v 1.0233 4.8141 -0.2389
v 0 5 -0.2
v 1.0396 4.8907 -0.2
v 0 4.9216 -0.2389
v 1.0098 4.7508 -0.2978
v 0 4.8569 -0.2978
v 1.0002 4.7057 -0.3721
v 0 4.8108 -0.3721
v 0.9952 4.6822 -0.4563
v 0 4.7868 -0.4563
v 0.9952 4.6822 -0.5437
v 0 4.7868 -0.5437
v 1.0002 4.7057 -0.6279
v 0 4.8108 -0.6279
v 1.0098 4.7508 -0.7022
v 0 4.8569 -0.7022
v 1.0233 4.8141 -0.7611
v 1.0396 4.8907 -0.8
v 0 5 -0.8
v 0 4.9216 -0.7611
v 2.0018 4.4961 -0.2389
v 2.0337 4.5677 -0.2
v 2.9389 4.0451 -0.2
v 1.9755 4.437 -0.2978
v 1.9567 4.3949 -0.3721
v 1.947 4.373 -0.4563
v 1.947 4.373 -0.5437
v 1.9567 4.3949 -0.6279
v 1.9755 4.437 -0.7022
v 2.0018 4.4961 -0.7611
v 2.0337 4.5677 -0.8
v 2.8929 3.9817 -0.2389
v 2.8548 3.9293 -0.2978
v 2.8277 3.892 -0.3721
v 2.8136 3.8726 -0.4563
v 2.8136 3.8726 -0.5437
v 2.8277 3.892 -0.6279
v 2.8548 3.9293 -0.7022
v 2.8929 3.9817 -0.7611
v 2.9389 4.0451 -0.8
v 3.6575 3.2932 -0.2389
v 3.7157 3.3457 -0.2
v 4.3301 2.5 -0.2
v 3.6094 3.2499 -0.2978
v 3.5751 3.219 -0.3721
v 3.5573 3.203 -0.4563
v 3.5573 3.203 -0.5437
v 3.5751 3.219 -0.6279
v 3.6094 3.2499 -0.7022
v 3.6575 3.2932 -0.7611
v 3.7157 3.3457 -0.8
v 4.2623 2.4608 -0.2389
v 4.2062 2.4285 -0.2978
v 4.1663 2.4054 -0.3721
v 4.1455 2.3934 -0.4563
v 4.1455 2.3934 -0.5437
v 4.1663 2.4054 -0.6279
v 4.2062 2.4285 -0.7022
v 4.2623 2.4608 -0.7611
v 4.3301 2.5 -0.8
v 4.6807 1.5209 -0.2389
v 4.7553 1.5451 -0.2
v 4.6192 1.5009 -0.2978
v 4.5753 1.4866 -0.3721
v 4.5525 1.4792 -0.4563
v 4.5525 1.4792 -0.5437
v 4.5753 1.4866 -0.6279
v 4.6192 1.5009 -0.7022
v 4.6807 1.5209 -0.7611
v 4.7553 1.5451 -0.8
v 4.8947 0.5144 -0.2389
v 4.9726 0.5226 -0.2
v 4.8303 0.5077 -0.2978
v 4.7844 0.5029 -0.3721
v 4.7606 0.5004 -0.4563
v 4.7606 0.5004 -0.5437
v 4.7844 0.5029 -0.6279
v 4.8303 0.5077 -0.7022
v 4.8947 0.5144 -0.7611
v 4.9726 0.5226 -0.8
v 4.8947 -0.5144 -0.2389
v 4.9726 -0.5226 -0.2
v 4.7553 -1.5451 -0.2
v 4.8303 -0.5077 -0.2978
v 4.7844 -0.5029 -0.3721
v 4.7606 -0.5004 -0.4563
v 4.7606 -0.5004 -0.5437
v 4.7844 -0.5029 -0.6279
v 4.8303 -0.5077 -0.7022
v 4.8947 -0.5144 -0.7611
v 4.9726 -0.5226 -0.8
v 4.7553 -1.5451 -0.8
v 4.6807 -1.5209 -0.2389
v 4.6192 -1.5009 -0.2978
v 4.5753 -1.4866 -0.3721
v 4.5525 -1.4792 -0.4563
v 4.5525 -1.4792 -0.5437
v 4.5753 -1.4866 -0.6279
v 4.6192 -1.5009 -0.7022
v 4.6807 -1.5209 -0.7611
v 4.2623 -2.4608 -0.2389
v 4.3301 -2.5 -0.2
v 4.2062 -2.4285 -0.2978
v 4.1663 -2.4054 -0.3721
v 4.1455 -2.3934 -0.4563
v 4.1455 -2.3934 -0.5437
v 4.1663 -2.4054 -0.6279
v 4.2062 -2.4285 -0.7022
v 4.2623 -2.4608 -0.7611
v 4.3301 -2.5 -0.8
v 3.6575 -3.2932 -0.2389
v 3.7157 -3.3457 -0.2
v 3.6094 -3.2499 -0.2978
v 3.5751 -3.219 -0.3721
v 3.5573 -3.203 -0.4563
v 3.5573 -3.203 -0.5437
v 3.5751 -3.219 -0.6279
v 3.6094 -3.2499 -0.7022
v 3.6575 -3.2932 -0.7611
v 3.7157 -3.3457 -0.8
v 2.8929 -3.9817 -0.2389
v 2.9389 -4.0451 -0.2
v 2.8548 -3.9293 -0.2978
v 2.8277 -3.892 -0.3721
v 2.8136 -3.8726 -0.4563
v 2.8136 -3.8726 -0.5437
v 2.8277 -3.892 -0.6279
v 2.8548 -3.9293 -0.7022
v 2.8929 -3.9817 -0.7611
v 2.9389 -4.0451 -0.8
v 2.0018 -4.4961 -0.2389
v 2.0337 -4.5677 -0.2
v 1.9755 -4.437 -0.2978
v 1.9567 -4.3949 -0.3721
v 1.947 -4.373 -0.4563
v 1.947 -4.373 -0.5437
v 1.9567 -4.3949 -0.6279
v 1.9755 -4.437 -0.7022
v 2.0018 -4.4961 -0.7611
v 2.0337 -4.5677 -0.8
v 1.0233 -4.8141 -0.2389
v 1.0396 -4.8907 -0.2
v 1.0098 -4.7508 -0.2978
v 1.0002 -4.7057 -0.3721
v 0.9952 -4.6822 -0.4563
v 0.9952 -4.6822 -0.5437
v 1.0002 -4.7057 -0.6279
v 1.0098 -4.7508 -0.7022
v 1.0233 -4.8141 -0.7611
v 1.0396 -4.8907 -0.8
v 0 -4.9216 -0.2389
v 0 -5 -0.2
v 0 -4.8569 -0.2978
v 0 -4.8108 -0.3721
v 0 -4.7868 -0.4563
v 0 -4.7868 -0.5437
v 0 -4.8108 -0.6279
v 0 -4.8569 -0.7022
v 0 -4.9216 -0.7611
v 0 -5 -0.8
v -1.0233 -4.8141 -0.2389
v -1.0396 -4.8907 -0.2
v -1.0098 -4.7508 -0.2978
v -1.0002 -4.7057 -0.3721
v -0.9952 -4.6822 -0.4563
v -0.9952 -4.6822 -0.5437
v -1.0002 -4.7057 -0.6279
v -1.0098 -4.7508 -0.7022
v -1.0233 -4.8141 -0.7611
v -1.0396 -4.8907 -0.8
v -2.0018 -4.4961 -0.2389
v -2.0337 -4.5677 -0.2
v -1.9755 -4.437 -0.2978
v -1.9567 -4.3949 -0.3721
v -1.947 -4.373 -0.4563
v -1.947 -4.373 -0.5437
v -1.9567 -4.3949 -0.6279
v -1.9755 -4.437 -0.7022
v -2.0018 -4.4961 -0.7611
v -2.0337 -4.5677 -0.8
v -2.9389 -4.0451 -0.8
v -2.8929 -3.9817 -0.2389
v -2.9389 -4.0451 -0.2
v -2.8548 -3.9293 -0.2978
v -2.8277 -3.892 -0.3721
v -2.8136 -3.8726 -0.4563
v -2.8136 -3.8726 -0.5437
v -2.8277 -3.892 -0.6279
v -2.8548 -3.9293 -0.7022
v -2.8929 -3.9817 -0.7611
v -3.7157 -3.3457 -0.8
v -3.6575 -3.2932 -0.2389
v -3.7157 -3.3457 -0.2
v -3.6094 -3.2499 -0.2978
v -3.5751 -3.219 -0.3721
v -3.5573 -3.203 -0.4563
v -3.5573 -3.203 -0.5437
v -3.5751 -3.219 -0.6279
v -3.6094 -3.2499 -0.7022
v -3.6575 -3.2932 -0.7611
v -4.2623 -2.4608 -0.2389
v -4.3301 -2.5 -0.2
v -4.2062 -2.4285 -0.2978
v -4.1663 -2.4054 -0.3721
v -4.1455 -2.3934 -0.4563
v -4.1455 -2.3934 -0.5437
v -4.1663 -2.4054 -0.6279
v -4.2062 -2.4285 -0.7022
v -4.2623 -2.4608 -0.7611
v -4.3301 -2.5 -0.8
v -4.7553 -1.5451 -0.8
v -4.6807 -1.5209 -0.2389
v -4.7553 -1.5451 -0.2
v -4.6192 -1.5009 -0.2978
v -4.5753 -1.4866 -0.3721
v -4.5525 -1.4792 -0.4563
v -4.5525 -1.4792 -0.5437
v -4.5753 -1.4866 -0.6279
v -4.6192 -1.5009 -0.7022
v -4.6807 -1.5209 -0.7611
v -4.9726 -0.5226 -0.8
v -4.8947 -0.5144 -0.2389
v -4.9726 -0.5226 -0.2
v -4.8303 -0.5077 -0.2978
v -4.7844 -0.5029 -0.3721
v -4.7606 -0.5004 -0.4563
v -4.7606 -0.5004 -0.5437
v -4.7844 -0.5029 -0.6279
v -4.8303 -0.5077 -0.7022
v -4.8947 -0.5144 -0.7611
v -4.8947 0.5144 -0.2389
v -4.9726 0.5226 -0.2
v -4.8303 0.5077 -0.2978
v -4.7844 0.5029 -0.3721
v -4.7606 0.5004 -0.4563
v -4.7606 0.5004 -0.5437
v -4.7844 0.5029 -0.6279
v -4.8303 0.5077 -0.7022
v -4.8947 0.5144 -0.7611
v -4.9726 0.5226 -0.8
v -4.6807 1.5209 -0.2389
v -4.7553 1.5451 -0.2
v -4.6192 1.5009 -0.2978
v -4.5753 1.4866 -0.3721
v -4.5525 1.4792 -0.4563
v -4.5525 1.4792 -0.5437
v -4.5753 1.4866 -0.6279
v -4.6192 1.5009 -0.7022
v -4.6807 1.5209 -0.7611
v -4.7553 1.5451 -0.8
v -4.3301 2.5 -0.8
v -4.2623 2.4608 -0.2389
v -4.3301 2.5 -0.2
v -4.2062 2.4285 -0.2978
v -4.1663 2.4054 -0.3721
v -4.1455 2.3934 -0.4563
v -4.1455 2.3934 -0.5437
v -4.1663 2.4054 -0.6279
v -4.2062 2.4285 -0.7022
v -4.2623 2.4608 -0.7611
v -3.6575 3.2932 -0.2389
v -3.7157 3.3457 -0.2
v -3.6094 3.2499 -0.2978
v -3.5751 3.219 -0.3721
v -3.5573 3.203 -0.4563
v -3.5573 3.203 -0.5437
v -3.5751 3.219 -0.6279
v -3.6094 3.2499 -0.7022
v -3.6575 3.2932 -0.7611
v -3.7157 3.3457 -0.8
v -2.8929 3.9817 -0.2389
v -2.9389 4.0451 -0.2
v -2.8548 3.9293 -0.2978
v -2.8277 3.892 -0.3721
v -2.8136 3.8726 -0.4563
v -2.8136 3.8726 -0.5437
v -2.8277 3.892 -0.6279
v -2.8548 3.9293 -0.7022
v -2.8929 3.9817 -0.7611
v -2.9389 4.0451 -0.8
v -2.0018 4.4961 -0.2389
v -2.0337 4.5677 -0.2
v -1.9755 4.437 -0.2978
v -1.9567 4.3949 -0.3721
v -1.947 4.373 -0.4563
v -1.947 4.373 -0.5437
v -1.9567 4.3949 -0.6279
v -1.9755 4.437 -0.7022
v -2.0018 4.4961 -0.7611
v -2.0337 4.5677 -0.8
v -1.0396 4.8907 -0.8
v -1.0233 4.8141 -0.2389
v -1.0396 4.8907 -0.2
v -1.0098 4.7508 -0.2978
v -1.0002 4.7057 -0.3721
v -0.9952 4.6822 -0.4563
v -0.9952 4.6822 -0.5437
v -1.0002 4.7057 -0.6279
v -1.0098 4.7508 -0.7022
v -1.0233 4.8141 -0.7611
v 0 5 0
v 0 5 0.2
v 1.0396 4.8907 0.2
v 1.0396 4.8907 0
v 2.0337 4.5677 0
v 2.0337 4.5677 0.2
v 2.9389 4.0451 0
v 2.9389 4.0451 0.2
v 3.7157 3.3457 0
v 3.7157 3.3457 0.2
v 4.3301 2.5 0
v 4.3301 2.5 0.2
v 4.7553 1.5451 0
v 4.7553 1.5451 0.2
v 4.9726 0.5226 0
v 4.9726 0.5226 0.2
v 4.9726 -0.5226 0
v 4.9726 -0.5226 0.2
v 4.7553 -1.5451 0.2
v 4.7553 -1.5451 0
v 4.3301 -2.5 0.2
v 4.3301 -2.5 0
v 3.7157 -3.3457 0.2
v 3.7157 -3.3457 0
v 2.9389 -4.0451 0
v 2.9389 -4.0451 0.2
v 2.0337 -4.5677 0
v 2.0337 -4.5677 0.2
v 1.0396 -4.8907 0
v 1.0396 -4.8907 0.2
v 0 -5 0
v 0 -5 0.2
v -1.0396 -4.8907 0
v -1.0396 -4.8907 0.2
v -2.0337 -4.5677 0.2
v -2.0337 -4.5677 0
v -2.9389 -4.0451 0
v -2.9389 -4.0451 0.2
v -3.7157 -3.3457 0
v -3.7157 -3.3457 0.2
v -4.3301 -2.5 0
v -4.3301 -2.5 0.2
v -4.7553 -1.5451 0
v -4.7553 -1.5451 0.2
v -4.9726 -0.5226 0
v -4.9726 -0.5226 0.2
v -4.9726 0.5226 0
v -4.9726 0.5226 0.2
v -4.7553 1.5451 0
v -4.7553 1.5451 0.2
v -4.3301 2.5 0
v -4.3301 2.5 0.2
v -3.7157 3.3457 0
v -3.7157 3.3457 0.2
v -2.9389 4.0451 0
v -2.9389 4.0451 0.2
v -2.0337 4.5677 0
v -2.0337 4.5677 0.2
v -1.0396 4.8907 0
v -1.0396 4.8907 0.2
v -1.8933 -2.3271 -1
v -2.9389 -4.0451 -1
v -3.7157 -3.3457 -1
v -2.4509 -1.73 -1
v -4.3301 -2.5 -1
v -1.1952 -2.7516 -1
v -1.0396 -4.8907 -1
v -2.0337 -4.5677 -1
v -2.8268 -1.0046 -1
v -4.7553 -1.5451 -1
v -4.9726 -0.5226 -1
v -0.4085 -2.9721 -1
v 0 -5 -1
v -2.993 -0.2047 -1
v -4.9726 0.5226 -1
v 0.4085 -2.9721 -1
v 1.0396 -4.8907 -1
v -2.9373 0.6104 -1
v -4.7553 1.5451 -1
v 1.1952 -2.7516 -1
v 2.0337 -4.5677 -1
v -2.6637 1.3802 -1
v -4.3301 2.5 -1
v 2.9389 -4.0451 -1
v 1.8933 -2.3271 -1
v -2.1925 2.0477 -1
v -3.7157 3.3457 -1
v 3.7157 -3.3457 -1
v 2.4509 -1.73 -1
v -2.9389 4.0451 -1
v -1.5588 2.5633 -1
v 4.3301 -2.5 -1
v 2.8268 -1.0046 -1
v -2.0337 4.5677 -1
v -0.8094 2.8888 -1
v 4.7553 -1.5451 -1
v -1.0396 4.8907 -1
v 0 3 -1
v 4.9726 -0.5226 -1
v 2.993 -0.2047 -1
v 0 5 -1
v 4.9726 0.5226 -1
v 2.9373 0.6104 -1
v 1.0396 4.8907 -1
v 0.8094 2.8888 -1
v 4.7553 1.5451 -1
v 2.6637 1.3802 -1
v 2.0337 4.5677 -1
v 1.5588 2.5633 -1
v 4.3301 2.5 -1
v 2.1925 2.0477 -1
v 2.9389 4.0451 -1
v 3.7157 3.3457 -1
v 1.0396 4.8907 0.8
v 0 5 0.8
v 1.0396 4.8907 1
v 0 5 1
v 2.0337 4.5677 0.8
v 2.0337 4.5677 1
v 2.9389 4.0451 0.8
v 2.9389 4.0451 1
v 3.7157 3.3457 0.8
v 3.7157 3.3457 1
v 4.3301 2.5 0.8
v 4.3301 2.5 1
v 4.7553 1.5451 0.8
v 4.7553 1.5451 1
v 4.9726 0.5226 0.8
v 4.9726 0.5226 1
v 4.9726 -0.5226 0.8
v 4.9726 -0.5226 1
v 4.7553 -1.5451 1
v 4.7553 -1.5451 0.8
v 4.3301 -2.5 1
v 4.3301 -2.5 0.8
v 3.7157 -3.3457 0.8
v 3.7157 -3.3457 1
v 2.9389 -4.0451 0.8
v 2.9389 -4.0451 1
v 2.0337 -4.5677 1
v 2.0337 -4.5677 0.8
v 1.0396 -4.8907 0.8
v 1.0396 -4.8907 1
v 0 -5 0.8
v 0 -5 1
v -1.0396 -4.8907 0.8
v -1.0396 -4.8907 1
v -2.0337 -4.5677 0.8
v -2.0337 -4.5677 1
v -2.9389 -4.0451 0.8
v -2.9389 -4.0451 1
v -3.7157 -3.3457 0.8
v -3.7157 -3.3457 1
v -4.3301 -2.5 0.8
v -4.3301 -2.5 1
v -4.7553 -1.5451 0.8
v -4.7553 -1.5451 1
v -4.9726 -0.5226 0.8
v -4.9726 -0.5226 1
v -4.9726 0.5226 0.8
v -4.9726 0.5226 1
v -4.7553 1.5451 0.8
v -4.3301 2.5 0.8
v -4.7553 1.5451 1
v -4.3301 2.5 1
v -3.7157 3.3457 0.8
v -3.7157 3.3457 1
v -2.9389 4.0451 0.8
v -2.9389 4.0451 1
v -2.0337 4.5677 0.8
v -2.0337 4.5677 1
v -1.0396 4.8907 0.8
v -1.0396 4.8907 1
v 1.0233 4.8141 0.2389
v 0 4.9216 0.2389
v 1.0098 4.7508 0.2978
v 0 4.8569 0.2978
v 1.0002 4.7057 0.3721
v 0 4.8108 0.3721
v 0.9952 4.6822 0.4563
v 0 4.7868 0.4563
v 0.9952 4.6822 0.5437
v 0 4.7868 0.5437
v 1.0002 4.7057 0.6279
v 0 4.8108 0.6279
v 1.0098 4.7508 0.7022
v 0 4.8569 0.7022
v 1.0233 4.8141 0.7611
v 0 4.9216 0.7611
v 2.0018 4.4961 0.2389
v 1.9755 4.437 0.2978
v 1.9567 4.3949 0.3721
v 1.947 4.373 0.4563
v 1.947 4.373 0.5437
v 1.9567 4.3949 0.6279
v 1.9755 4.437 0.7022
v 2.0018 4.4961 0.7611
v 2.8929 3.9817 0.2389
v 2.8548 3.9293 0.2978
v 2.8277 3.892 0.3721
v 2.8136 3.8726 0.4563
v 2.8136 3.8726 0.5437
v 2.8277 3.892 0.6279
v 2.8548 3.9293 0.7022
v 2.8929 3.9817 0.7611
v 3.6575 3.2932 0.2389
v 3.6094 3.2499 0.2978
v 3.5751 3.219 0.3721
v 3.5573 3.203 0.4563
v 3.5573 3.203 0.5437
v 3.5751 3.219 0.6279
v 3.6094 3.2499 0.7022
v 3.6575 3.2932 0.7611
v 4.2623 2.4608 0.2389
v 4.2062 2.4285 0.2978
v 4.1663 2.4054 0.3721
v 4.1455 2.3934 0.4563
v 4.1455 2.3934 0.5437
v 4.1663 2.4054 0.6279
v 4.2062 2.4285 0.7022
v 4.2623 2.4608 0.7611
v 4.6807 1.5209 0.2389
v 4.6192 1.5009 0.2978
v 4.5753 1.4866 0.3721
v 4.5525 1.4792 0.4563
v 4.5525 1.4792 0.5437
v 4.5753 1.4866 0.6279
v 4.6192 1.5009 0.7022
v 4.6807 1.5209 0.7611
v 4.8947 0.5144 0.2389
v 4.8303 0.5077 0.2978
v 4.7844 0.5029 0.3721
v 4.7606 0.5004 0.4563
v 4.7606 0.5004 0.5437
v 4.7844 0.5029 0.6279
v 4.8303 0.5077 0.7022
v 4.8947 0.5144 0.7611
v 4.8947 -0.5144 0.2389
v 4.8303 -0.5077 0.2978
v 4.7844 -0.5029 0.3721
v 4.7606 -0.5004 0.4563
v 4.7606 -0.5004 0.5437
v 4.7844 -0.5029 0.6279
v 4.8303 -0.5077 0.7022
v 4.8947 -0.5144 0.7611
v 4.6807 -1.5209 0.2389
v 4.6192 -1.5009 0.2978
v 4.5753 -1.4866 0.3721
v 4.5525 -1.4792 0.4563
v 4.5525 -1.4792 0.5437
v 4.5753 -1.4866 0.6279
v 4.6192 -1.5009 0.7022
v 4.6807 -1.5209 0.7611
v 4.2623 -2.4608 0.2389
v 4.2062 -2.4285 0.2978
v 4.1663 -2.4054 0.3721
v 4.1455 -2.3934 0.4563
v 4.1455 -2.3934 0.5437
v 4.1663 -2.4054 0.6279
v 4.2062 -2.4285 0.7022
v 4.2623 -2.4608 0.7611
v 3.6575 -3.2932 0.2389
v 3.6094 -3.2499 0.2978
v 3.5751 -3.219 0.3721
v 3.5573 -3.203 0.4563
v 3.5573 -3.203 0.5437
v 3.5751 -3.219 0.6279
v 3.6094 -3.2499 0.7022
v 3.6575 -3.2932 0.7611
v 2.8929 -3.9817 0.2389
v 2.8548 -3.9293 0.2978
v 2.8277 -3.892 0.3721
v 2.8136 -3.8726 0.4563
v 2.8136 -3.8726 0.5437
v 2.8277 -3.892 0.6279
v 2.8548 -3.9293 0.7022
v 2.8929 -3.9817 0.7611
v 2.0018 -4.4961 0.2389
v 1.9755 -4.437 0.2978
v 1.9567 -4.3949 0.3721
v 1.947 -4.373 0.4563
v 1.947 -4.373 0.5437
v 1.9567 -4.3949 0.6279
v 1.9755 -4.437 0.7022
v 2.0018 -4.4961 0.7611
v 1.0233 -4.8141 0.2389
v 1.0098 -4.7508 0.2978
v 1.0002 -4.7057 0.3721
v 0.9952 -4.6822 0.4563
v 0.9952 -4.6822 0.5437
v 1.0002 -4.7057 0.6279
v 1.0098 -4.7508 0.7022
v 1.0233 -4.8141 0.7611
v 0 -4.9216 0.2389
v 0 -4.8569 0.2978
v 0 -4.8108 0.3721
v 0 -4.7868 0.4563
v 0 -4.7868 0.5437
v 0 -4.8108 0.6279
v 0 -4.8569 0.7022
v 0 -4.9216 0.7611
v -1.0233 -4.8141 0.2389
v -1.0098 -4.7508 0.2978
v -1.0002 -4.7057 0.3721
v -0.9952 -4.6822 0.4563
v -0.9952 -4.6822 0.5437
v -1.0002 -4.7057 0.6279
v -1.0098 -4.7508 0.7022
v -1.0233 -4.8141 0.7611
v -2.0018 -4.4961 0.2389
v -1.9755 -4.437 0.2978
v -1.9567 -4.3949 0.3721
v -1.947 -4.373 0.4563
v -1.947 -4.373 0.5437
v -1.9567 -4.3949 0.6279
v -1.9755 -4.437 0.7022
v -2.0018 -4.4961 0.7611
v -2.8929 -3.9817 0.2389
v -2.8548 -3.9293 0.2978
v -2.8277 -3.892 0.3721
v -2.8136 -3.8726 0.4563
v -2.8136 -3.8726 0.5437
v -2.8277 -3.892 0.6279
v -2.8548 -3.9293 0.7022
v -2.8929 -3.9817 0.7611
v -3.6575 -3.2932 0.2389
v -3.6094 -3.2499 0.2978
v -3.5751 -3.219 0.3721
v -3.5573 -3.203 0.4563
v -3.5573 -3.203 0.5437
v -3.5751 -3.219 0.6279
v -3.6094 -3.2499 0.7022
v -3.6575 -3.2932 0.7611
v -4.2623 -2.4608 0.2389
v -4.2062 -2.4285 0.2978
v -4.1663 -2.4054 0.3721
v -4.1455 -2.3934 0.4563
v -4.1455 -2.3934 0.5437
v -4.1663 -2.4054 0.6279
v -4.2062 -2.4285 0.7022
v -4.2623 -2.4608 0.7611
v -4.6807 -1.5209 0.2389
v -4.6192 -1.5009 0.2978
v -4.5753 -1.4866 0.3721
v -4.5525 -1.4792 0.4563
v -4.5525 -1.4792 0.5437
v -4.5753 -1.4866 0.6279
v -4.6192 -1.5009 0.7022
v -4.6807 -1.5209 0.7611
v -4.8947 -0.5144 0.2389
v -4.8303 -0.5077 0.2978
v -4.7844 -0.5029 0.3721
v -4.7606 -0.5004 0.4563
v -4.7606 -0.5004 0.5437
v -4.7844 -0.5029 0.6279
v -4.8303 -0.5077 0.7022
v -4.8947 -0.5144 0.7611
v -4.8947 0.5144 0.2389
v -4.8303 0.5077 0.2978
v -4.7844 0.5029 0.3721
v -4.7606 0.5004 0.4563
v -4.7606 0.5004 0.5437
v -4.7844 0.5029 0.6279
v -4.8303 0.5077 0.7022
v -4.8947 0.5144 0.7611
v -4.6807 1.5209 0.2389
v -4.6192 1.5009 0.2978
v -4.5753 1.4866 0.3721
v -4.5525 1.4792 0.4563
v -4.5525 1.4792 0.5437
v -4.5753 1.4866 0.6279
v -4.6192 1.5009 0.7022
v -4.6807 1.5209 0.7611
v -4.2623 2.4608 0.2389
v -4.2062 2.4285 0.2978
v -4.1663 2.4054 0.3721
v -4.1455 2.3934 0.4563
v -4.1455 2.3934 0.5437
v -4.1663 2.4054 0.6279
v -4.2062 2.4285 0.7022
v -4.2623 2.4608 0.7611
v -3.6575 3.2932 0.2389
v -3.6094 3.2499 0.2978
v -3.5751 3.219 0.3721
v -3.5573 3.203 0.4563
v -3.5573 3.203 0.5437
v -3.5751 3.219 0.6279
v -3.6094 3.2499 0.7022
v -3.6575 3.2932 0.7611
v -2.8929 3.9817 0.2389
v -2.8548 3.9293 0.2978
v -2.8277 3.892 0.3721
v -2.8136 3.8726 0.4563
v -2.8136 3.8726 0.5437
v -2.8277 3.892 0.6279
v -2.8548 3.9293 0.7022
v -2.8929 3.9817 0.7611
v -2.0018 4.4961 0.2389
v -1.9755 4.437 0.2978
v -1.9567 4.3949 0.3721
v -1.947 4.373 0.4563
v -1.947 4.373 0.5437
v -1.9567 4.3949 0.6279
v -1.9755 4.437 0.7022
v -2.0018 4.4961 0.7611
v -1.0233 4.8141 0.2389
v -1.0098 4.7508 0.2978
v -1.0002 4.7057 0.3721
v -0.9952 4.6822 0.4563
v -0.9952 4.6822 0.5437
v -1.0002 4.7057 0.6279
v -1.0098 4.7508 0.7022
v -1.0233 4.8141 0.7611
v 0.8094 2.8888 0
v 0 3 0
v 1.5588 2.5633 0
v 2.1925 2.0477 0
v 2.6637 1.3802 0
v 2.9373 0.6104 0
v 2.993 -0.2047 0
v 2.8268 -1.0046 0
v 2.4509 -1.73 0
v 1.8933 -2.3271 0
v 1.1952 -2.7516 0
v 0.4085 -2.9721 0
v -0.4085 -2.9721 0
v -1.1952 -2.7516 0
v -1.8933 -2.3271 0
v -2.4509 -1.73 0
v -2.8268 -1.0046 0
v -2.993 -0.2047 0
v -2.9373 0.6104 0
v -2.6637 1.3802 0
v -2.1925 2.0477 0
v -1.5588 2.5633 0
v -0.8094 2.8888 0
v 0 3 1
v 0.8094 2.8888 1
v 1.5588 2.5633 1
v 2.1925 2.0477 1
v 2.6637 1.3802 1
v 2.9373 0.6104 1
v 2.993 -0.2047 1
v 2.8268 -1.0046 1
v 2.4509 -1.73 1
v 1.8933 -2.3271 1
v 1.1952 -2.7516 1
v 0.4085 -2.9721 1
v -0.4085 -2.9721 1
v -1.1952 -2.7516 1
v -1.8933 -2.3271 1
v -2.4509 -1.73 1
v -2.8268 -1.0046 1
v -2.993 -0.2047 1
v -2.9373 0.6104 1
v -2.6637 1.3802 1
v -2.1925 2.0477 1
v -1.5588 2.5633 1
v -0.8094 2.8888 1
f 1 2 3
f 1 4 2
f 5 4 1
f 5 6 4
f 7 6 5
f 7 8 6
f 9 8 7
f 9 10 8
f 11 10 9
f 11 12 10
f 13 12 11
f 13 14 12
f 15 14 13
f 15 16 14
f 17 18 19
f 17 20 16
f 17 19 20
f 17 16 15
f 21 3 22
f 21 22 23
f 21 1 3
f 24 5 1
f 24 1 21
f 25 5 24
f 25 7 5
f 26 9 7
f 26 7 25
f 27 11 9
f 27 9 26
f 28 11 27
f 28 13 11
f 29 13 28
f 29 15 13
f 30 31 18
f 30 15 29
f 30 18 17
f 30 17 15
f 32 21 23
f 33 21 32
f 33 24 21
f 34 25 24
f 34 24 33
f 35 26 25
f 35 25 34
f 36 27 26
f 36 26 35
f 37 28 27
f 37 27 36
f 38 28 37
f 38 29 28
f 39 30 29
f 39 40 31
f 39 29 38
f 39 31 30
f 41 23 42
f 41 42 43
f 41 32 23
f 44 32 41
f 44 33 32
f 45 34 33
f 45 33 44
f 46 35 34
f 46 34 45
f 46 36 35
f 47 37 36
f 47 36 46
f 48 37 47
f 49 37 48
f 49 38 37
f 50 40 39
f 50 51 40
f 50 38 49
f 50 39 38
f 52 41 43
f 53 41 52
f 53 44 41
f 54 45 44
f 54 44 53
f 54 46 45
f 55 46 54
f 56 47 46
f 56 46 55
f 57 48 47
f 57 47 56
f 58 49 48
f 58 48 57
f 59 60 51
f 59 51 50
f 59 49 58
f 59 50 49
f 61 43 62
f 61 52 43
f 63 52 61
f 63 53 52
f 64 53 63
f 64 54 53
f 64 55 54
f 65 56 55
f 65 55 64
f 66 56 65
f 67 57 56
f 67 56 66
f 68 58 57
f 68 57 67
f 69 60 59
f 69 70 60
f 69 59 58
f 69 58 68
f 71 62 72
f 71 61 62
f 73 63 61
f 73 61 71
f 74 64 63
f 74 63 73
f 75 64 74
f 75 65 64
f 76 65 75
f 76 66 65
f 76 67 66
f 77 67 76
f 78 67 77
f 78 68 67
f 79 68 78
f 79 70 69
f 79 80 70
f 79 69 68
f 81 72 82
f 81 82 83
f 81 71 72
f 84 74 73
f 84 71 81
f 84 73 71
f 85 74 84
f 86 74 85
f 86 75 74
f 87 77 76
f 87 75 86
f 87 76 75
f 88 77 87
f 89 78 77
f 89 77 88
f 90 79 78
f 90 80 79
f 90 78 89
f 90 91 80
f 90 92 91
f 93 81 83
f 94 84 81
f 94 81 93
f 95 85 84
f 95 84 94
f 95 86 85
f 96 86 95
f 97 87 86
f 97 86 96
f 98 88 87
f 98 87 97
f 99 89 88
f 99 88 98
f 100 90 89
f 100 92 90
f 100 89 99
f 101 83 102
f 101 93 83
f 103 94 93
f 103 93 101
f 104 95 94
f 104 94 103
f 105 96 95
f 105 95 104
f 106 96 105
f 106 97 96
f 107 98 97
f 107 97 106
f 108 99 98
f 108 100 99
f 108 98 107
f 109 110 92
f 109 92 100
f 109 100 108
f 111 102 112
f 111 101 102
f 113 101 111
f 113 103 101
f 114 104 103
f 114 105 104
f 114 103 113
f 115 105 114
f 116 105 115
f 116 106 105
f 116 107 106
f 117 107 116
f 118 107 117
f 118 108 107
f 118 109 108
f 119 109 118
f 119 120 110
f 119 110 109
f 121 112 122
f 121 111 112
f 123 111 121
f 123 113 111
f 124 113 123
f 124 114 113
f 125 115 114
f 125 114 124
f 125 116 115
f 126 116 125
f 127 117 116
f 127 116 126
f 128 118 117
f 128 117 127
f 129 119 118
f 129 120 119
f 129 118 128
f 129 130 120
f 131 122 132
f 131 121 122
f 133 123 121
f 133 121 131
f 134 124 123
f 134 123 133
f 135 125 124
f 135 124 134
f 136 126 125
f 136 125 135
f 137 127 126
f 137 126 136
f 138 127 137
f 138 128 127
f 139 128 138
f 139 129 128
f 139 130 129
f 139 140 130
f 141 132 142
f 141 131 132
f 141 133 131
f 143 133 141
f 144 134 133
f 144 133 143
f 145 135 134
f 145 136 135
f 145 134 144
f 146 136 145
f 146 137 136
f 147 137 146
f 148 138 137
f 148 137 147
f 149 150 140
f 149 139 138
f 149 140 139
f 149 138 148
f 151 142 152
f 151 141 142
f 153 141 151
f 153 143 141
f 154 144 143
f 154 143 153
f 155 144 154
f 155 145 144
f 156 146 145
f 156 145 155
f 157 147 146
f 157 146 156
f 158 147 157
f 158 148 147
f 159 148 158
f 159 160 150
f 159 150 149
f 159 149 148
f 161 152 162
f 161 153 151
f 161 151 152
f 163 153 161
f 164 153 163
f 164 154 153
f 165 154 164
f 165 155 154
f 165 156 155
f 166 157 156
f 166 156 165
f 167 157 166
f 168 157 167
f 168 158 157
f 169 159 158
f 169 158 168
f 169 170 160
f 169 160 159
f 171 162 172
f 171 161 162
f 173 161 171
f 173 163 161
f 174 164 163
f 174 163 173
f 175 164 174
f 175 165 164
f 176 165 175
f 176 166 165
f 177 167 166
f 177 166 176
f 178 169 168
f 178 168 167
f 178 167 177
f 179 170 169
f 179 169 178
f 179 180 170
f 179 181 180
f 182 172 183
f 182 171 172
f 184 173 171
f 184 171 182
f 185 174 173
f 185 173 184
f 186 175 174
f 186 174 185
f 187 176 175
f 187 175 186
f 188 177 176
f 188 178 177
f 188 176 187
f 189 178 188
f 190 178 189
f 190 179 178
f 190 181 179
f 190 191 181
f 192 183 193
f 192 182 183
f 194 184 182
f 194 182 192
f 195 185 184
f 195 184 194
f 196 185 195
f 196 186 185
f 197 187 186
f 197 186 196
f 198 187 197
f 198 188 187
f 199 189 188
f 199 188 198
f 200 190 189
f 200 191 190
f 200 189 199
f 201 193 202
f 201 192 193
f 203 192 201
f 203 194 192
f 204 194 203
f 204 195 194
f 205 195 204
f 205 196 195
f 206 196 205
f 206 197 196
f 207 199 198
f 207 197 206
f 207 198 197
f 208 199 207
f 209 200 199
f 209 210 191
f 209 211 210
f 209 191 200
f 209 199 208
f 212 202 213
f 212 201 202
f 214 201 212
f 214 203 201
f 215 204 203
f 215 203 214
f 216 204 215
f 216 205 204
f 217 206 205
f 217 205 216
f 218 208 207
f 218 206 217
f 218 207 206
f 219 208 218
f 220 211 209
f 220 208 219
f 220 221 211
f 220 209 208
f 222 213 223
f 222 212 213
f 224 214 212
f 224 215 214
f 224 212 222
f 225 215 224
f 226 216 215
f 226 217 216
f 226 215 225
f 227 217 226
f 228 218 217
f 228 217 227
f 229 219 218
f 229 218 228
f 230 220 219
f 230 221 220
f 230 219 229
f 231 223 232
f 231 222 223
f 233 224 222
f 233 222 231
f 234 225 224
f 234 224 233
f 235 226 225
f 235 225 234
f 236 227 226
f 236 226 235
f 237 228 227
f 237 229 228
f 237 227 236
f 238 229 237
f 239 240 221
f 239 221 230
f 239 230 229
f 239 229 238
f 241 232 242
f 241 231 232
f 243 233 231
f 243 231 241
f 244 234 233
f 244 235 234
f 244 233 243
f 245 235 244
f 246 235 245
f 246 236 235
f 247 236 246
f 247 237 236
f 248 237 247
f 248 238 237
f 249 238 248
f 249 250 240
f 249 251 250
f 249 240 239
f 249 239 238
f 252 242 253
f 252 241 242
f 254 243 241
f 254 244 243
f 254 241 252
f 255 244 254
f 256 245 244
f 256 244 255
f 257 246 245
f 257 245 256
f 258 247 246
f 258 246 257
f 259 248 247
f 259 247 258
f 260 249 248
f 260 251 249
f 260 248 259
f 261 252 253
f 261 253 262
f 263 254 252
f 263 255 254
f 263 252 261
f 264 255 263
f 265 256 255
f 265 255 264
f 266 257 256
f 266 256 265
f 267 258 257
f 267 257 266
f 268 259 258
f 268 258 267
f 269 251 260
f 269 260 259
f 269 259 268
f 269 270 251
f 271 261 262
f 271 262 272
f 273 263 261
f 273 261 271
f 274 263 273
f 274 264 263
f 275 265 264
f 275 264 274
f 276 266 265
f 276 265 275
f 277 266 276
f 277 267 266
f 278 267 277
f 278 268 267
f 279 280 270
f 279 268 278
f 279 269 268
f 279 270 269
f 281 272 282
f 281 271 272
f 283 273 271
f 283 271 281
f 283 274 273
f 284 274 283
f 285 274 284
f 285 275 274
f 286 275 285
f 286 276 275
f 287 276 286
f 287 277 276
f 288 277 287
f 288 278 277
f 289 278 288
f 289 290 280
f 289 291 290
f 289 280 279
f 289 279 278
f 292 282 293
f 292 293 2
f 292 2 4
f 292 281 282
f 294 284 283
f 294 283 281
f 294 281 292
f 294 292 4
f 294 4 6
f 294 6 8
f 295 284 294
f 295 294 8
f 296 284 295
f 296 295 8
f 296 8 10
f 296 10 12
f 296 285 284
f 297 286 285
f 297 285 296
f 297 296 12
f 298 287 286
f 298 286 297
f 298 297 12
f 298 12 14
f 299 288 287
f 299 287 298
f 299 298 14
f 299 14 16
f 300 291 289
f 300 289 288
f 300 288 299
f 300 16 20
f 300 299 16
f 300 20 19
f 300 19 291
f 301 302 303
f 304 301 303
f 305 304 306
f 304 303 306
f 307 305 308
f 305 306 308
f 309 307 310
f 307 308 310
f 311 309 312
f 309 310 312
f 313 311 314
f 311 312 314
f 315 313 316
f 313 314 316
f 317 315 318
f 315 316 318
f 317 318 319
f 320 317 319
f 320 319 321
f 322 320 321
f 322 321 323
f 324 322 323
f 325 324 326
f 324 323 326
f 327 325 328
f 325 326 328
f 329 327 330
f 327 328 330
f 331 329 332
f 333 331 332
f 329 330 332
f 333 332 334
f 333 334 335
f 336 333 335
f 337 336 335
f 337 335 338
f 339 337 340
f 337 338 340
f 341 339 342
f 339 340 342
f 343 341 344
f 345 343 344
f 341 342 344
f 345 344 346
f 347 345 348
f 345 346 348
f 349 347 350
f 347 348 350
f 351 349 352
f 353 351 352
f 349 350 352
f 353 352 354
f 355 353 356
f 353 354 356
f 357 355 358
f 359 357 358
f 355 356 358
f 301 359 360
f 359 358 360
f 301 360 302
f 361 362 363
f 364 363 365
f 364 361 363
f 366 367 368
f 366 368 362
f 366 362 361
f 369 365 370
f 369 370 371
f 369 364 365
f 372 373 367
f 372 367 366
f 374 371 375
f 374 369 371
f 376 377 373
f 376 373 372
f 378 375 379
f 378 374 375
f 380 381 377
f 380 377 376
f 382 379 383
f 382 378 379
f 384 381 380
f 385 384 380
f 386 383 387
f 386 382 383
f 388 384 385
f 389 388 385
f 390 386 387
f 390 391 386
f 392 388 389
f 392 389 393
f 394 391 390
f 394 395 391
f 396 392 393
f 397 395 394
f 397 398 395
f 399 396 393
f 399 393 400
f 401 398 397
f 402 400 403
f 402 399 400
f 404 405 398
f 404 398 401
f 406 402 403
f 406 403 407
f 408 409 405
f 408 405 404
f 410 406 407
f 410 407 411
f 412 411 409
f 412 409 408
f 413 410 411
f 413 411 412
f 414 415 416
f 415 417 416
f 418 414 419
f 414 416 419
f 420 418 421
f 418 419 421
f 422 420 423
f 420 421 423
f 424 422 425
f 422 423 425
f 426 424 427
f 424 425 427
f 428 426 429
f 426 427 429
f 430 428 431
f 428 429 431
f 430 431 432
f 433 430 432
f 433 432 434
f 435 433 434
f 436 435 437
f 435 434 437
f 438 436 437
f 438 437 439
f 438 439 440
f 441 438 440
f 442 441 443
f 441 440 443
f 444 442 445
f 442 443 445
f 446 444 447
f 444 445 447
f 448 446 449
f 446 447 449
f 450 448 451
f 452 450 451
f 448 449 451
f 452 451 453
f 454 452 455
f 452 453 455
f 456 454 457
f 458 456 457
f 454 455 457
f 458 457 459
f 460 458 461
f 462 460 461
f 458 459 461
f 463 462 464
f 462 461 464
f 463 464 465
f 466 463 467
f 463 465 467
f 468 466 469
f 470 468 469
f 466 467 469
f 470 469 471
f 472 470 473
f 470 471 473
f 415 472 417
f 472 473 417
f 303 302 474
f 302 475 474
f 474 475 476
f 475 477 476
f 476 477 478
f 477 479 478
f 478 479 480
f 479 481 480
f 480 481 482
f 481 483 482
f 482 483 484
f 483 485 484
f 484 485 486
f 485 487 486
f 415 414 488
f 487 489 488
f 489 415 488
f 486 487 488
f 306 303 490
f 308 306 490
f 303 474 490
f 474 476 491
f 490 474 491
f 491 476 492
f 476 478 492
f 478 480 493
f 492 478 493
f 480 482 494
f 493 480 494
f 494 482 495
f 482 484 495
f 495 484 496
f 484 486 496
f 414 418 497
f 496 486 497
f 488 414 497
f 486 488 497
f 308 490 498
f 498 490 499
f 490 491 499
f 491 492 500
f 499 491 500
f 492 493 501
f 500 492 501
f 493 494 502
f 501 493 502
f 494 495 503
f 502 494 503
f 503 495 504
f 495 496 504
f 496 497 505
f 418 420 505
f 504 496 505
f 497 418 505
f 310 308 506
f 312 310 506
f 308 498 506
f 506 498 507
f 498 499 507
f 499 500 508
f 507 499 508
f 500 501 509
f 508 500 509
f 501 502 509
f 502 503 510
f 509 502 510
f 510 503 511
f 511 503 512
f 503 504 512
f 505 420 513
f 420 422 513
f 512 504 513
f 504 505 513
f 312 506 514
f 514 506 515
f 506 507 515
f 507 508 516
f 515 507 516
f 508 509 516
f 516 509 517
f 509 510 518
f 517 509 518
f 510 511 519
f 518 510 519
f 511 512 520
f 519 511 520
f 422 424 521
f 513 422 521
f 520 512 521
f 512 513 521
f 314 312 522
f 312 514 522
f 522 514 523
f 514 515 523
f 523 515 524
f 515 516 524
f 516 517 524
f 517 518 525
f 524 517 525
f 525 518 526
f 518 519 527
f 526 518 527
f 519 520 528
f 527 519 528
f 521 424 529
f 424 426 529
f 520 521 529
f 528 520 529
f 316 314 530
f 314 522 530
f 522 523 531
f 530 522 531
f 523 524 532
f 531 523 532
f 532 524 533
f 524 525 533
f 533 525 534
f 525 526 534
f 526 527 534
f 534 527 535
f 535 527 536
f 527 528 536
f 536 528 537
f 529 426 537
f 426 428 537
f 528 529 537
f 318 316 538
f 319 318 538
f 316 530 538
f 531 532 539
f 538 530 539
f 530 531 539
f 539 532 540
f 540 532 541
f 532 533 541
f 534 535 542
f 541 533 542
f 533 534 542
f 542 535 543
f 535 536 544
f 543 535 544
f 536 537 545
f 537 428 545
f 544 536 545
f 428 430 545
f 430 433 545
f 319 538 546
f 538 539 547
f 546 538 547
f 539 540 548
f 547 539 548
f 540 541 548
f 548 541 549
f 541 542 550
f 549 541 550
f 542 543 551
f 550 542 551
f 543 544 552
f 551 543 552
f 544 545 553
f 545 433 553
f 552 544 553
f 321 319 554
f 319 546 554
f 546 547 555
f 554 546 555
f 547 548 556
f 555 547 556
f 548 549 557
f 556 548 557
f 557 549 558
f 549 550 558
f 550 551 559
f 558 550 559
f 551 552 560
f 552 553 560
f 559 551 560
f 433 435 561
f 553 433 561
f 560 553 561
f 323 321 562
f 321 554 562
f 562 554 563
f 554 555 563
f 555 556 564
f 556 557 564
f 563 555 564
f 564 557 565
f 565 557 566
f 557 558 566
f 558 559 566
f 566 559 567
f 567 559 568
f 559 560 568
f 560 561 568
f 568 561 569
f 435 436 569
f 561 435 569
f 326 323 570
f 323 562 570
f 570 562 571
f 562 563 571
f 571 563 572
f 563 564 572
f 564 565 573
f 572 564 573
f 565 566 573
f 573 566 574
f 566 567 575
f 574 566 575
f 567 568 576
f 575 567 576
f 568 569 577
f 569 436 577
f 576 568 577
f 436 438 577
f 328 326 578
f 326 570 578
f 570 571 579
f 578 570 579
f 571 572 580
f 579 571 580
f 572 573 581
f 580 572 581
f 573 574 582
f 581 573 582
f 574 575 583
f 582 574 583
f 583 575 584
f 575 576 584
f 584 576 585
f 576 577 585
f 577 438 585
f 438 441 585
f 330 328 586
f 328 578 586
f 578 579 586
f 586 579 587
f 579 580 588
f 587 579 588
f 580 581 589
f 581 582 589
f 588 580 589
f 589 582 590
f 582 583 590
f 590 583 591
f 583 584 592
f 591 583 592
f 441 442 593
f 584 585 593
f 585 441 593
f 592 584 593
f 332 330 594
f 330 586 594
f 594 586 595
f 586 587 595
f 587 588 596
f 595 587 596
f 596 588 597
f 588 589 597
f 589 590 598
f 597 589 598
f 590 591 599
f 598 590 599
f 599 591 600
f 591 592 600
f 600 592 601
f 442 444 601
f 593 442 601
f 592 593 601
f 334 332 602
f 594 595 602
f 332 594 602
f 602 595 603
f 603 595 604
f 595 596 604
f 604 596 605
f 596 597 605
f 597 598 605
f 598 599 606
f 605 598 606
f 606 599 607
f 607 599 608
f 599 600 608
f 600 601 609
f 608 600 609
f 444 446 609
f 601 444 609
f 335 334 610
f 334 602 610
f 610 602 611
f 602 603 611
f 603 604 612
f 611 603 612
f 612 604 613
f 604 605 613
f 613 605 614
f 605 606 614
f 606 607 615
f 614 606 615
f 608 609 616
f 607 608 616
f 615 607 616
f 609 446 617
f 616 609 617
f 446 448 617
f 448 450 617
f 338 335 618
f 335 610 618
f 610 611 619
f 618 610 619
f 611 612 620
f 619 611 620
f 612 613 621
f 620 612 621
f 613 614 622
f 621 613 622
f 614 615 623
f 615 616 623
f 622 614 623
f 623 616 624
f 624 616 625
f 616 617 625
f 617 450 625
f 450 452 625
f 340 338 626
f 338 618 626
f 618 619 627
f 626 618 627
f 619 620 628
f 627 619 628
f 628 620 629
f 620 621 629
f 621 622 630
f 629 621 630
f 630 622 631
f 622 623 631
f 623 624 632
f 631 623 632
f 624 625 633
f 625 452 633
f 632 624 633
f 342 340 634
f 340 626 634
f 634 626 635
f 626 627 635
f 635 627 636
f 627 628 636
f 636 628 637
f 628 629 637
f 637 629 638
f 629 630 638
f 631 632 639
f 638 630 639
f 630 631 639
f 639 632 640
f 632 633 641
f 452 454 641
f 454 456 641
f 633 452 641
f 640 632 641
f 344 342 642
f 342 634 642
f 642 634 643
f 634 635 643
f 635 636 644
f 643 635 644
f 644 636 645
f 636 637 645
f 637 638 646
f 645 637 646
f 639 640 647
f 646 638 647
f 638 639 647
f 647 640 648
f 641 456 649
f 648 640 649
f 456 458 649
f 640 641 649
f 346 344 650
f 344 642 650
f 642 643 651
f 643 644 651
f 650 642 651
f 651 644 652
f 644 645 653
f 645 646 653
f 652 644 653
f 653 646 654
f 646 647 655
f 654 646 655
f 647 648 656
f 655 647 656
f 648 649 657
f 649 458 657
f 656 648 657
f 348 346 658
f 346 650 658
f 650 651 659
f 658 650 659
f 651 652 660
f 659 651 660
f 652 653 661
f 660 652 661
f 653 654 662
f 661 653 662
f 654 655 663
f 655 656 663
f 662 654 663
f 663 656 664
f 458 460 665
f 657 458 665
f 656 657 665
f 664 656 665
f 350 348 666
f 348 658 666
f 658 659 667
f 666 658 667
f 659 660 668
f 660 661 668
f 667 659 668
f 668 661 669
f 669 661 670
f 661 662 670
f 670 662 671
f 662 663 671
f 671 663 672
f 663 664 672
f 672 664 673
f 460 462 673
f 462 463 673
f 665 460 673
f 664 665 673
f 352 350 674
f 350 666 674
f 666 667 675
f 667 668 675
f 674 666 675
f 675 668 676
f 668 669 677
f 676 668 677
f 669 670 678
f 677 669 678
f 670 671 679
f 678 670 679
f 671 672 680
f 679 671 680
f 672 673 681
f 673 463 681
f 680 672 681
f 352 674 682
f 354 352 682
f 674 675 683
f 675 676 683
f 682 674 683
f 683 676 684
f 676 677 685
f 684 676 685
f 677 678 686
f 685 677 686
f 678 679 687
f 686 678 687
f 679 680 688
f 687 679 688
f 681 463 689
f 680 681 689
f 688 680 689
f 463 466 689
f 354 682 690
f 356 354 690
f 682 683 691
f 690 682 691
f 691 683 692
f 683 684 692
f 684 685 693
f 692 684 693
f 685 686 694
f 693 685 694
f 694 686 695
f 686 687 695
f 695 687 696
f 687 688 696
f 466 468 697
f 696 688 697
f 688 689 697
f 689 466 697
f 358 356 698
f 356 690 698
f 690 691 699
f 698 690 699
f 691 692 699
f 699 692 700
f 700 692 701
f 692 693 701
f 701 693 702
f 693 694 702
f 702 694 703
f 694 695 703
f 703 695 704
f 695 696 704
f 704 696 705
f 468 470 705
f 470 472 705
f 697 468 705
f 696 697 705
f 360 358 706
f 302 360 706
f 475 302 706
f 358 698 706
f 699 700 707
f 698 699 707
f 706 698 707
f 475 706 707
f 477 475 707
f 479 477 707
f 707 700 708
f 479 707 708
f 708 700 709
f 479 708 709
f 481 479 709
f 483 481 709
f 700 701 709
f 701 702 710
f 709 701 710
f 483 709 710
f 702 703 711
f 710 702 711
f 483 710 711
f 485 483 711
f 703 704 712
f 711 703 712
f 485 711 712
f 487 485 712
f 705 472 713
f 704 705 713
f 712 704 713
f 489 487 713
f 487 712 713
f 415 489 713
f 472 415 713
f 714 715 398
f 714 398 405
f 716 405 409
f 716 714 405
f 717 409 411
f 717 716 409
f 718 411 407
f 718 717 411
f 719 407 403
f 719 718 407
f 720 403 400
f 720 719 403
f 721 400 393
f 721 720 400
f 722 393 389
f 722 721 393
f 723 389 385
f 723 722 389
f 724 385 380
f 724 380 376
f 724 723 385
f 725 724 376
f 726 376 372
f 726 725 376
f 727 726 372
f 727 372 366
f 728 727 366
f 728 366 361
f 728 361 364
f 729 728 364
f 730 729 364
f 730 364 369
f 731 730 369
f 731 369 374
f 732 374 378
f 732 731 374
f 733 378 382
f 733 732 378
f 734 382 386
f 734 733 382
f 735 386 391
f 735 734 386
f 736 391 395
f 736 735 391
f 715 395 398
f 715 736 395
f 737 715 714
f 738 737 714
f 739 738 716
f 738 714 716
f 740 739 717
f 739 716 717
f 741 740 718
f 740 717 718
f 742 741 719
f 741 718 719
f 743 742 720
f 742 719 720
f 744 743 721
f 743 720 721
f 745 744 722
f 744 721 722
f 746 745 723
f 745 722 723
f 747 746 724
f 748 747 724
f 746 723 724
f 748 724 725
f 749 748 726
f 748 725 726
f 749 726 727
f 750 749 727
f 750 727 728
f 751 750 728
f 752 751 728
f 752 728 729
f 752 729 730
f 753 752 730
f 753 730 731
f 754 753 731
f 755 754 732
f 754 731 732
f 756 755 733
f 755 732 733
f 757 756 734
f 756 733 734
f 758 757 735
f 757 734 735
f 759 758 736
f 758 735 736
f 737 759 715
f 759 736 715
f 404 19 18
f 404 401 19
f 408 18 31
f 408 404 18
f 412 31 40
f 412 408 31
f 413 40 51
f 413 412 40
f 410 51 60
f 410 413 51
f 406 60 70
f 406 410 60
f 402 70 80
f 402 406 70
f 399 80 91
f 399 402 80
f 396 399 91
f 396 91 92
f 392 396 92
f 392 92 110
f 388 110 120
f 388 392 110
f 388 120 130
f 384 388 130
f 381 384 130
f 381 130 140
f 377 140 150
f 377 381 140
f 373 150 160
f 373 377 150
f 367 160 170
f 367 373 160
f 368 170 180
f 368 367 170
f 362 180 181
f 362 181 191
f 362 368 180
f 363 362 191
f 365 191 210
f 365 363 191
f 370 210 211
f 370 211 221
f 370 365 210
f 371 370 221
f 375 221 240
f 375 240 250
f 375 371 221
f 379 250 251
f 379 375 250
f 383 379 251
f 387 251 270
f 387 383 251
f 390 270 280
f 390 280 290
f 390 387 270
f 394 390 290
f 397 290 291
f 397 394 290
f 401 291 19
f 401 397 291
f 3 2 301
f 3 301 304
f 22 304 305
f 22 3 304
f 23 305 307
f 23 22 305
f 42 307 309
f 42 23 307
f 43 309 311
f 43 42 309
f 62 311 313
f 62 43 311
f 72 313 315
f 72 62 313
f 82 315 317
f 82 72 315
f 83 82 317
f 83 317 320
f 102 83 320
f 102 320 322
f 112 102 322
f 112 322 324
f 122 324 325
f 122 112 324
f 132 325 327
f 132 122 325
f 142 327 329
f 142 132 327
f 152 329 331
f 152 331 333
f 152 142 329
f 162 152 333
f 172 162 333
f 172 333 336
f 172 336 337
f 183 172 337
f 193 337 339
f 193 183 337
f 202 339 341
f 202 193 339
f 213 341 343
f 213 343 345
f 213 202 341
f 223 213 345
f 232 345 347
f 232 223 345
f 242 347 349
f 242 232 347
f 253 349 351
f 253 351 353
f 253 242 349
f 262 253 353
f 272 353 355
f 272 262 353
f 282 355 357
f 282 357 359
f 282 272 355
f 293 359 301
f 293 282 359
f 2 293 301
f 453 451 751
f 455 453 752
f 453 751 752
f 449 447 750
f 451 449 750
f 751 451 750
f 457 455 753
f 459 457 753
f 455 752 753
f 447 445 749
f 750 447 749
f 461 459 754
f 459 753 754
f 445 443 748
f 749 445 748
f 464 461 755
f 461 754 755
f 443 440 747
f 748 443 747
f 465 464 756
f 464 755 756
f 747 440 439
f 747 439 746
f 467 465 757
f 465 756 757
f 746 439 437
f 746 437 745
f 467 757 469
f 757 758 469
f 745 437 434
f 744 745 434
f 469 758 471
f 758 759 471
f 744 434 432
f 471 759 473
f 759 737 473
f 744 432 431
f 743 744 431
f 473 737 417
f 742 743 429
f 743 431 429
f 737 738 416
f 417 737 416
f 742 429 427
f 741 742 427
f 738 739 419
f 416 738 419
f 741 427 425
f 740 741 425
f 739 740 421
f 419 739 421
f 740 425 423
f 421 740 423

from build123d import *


with BuildPart() as part:
    # Sketch2 → Revolve1 (revolve)
    with BuildSketch(Plane(origin=(0, 0, 0), x_dir=(0, 0, -1), z_dir=(1, 0, 0))):
        with BuildLine():
            Line((0, 3), (0, 5))
            Line((0, 5), (-0.2, 5))
            ThreePointArc((-0.2, 5), (-0.5, 4.783772234), (-0.8, 5))
            Line((-0.8, 5), (-1, 5))
            Line((-1, 5), (-1, 3))
            Line((-1, 3), (0, 3))
        make_face()
    revolve1 = revolve(axis=Axis((0, 0, 3.014677367), (0, 0, -1)))

    # Mirror2: Revolve1 across plane
    add(revolve1.mirror(Plane(origin=(0, 0, 0), x_dir=(1, 0, 0), z_dir=(0, 0, -1))))


solid = part.part
